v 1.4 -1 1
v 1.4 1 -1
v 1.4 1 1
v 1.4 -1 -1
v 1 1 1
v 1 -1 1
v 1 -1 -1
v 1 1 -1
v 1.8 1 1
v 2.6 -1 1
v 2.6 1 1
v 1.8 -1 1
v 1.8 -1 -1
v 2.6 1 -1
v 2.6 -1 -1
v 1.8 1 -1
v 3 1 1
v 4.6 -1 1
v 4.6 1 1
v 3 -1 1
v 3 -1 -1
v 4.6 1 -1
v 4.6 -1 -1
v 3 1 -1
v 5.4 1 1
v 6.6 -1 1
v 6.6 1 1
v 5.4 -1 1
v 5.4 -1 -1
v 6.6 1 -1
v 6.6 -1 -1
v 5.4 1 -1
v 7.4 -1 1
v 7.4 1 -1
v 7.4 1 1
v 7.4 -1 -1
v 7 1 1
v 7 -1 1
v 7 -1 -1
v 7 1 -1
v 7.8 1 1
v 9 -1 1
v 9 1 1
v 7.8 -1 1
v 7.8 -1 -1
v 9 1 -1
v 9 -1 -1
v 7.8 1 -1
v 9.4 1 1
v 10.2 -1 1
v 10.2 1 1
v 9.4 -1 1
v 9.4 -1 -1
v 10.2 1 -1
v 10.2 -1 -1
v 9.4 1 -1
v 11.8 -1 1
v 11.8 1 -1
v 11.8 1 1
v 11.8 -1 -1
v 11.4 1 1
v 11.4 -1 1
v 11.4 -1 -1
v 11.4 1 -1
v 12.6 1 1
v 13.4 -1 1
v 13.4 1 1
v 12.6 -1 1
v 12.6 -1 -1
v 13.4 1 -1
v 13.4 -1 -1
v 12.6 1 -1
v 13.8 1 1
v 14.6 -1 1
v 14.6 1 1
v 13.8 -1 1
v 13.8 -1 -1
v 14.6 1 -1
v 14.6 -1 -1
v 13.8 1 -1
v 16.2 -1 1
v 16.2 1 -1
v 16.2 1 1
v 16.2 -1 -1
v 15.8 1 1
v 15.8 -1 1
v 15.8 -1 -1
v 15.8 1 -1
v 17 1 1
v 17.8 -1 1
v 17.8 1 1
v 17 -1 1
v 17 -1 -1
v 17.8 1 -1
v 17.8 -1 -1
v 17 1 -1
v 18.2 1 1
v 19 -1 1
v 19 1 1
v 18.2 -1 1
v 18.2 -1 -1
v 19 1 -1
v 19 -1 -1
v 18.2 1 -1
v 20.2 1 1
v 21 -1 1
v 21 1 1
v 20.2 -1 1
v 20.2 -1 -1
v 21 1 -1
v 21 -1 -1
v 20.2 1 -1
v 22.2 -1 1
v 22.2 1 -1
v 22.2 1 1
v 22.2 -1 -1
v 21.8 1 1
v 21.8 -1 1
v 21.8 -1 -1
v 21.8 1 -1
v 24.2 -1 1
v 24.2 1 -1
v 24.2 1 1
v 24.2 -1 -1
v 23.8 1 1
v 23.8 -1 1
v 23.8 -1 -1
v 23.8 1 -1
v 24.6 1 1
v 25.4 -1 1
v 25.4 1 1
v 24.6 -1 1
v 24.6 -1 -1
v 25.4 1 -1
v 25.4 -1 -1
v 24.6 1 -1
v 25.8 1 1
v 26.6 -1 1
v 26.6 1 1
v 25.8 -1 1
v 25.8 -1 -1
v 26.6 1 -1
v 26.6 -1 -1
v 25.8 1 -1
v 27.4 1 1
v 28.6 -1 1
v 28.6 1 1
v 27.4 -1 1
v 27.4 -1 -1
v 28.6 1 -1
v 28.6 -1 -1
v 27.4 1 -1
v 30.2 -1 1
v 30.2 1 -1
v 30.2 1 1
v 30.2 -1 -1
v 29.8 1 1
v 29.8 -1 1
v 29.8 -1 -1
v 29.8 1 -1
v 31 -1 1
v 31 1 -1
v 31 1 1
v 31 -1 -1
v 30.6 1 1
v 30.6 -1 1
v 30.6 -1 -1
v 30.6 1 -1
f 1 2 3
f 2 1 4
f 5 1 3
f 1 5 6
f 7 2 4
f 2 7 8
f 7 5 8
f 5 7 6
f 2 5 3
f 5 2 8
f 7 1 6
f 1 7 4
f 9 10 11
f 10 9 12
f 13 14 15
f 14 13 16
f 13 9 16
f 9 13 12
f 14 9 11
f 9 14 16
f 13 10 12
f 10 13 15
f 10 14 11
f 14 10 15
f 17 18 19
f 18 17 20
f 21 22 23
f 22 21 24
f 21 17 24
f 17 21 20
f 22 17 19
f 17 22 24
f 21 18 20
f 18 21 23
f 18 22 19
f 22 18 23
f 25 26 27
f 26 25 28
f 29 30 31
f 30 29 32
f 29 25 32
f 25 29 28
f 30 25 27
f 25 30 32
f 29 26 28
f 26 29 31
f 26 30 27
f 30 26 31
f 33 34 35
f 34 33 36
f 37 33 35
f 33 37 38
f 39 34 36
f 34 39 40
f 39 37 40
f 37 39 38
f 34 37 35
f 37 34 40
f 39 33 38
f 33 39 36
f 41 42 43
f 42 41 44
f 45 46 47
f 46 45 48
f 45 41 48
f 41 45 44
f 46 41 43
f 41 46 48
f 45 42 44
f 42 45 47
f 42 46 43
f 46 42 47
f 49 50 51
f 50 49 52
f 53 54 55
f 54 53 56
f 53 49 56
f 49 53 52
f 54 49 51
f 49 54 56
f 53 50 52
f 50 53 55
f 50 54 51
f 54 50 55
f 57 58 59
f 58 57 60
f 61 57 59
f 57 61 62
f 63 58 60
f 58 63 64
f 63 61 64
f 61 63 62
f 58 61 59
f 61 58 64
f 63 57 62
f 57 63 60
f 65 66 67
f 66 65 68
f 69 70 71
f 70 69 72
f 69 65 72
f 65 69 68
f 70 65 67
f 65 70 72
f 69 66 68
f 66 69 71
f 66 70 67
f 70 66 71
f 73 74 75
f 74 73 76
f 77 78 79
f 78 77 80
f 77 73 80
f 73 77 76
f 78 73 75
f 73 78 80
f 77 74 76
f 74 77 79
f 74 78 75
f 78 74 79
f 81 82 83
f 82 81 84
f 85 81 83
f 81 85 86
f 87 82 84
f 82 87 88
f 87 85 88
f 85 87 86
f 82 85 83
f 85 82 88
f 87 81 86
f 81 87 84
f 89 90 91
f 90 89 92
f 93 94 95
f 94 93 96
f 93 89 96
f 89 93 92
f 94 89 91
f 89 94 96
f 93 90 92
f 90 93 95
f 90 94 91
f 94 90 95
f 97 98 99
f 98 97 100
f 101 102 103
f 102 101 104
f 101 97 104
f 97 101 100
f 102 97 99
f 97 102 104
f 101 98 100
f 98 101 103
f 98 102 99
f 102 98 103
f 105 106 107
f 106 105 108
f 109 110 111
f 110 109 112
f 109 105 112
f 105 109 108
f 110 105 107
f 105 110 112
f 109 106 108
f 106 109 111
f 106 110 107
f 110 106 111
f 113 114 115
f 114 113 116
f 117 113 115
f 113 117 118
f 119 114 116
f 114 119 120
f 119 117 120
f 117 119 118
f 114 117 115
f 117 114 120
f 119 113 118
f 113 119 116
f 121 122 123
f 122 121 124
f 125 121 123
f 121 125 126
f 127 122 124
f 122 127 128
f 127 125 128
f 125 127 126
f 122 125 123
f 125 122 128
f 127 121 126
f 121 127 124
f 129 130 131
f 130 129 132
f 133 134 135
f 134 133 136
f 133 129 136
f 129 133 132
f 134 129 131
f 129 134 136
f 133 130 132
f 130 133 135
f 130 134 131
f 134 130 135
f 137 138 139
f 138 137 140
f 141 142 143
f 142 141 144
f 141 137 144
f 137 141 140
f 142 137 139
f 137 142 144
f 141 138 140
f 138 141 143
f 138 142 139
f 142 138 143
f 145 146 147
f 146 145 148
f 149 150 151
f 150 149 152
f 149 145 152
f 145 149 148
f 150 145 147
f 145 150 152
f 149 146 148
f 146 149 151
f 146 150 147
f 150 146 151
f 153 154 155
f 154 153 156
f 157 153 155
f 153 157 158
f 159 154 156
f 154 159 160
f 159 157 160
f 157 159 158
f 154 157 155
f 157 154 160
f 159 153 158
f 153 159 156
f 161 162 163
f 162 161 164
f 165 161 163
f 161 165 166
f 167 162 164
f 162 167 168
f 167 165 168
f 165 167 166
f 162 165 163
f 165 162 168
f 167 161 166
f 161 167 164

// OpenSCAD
translate([1.2,0,0])  cube(size = [0.4,2,2], center=true);
translate([2,0,0])  cube(size = [0.4,2,2], center=true);
translate([2.4,0,0])  cube(size = [0.4,2,2], center=true);
translate([3.2,0,0])  cube(size = [0.4,2,2], center=true);
translate([3.6,0,0])  cube(size = [0.4,2,2], center=true);
translate([4,0,0])  cube(size = [0.4,2,2], center=true);
translate([4.4,0,0])  cube(size = [0.4,2,2], center=true);
translate([5.6,0,0])  cube(size = [0.4,2,2], center=true);
translate([6,0,0])  cube(size = [0.4,2,2], center=true);
translate([6.4,0,0])  cube(size = [0.4,2,2], center=true);
translate([7.2,0,0])  cube(size = [0.4,2,2], center=true);
translate([8,0,0])  cube(size = [0.4,2,2], center=true);
translate([8.4,0,0])  cube(size = [0.4,2,2], center=true);
translate([8.8,0,0])  cube(size = [0.4,2,2], center=true);
translate([9.6,0,0])  cube(size = [0.4,2,2], center=true);
translate([10,0,0])  cube(size = [0.4,2,2], center=true);
translate([11.6,0,0])  cube(size = [0.4,2,2], center=true);
translate([12.8,0,0])  cube(size = [0.4,2,2], center=true);
translate([13.2,0,0])  cube(size = [0.4,2,2], center=true);
translate([14,0,0])  cube(size = [0.4,2,2], center=true);
translate([14.4,0,0])  cube(size = [0.4,2,2], center=true);
translate([16,0,0])  cube(size = [0.4,2,2], center=true);
translate([17.2,0,0])  cube(size = [0.4,2,2], center=true);
translate([17.6,0,0])  cube(size = [0.4,2,2], center=true);
translate([18.4,0,0])  cube(size = [0.4,2,2], center=true);
translate([18.8,0,0])  cube(size = [0.4,2,2], center=true);
translate([20.4,0,0])  cube(size = [0.4,2,2], center=true);
translate([20.8,0,0])  cube(size = [0.4,2,2], center=true);
translate([22,0,0])  cube(size = [0.4,2,2], center=true);
translate([24,0,0])  cube(size = [0.4,2,2], center=true);
translate([24.8,0,0])  cube(size = [0.4,2,2], center=true);
translate([25.2,0,0])  cube(size = [0.4,2,2], center=true);
translate([26,0,0])  cube(size = [0.4,2,2], center=true);
translate([26.4,0,0])  cube(size = [0.4,2,2], center=true);
translate([27.6,0,0])  cube(size = [0.4,2,2], center=true);
translate([28,0,0])  cube(size = [0.4,2,2], center=true);
translate([28.4,0,0])  cube(size = [0.4,2,2], center=true);
translate([30,0,0])  cube(size = [0.4,2,2], center=true);
translate([30.8,0,0])  cube(size = [0.4,2,2], center=true);
